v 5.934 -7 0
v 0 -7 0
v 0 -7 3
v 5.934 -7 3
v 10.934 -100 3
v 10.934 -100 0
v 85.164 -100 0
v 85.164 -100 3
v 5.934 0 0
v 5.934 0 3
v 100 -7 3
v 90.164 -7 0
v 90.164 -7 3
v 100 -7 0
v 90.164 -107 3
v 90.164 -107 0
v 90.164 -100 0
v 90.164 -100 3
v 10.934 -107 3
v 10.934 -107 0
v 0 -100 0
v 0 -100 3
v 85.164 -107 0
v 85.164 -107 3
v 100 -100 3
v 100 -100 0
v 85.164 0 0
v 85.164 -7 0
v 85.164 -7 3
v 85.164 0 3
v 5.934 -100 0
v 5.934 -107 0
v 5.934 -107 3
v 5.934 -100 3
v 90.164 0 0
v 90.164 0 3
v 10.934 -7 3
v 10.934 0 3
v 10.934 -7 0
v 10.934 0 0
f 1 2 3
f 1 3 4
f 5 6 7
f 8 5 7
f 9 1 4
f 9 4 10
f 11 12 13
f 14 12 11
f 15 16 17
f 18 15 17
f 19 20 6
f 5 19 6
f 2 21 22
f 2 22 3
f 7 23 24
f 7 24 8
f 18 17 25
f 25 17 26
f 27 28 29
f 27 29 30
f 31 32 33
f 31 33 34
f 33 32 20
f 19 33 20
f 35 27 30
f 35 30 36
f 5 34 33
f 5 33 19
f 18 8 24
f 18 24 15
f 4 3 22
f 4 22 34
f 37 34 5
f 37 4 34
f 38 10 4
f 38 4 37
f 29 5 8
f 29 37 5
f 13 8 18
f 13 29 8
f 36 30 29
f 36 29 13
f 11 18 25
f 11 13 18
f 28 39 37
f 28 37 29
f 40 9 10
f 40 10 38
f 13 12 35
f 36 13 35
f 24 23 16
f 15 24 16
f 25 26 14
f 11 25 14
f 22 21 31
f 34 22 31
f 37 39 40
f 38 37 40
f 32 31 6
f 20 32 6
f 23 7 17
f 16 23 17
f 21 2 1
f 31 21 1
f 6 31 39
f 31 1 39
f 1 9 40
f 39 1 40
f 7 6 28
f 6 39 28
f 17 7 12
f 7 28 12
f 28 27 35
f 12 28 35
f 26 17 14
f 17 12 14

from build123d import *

# Parameters (mm, degrees)
SKETCH1_W                     = 100
SKETCH1_H                     = 107
BOSS_EXTRUDE1_DEPTH           = 3
CUT_EXTRUDE_THIN2_START       = -3
CUT_EXTRUDE_THIN2_OUTLINE_W   = 5.933508572
CUT_EXTRUDE_THIN2_OUTLINE_H   = 7
CUT_EXTRUDE_THIN2_OUTLINE_W_2 = 74.23028827
CUT_EXTRUDE_THIN2_OUTLINE_W_3 = 9.836203158
CUT_EXTRUDE_THIN2_DEPTH       = 3


# Read off the part's stored shape, not the designer's step: Cut-Extrude-Thin2
with BuildPart() as part:
    # Sketch1 → Boss-Extrude1 (new body)
    with BuildSketch(Plane.XY):
        with Locations((50, -53.5)):
            Rectangle(SKETCH1_W, SKETCH1_H)
    extrude(amount=BOSS_EXTRUDE1_DEPTH)

    # Cut-Extrude-Thin2 outline → Cut-Extrude-Thin2 (cut)
    with BuildSketch(Plane.XY.offset(3).offset(CUT_EXTRUDE_THIN2_START)):
        with Locations((2.966754286, -103.5)):
            Rectangle(CUT_EXTRUDE_THIN2_OUTLINE_W, CUT_EXTRUDE_THIN2_OUTLINE_H)
        with Locations((48.048652707, -103.5)):
            Rectangle(CUT_EXTRUDE_THIN2_OUTLINE_W_2, CUT_EXTRUDE_THIN2_OUTLINE_H)
        with Locations((2.966754286, -3.5)):
            Rectangle(CUT_EXTRUDE_THIN2_OUTLINE_W, CUT_EXTRUDE_THIN2_OUTLINE_H)
        with Locations((95.081898421, -103.5)):
            Rectangle(CUT_EXTRUDE_THIN2_OUTLINE_W_3, CUT_EXTRUDE_THIN2_OUTLINE_H)
        with Locations((48.048652707, -3.5)):
            Rectangle(CUT_EXTRUDE_THIN2_OUTLINE_W_2, CUT_EXTRUDE_THIN2_OUTLINE_H)
        with Locations((95.081898421, -3.5)):
            Rectangle(CUT_EXTRUDE_THIN2_OUTLINE_W_3, CUT_EXTRUDE_THIN2_OUTLINE_H)
    extrude(amount=CUT_EXTRUDE_THIN2_DEPTH, mode=Mode.SUBTRACT)


solid = part.part
